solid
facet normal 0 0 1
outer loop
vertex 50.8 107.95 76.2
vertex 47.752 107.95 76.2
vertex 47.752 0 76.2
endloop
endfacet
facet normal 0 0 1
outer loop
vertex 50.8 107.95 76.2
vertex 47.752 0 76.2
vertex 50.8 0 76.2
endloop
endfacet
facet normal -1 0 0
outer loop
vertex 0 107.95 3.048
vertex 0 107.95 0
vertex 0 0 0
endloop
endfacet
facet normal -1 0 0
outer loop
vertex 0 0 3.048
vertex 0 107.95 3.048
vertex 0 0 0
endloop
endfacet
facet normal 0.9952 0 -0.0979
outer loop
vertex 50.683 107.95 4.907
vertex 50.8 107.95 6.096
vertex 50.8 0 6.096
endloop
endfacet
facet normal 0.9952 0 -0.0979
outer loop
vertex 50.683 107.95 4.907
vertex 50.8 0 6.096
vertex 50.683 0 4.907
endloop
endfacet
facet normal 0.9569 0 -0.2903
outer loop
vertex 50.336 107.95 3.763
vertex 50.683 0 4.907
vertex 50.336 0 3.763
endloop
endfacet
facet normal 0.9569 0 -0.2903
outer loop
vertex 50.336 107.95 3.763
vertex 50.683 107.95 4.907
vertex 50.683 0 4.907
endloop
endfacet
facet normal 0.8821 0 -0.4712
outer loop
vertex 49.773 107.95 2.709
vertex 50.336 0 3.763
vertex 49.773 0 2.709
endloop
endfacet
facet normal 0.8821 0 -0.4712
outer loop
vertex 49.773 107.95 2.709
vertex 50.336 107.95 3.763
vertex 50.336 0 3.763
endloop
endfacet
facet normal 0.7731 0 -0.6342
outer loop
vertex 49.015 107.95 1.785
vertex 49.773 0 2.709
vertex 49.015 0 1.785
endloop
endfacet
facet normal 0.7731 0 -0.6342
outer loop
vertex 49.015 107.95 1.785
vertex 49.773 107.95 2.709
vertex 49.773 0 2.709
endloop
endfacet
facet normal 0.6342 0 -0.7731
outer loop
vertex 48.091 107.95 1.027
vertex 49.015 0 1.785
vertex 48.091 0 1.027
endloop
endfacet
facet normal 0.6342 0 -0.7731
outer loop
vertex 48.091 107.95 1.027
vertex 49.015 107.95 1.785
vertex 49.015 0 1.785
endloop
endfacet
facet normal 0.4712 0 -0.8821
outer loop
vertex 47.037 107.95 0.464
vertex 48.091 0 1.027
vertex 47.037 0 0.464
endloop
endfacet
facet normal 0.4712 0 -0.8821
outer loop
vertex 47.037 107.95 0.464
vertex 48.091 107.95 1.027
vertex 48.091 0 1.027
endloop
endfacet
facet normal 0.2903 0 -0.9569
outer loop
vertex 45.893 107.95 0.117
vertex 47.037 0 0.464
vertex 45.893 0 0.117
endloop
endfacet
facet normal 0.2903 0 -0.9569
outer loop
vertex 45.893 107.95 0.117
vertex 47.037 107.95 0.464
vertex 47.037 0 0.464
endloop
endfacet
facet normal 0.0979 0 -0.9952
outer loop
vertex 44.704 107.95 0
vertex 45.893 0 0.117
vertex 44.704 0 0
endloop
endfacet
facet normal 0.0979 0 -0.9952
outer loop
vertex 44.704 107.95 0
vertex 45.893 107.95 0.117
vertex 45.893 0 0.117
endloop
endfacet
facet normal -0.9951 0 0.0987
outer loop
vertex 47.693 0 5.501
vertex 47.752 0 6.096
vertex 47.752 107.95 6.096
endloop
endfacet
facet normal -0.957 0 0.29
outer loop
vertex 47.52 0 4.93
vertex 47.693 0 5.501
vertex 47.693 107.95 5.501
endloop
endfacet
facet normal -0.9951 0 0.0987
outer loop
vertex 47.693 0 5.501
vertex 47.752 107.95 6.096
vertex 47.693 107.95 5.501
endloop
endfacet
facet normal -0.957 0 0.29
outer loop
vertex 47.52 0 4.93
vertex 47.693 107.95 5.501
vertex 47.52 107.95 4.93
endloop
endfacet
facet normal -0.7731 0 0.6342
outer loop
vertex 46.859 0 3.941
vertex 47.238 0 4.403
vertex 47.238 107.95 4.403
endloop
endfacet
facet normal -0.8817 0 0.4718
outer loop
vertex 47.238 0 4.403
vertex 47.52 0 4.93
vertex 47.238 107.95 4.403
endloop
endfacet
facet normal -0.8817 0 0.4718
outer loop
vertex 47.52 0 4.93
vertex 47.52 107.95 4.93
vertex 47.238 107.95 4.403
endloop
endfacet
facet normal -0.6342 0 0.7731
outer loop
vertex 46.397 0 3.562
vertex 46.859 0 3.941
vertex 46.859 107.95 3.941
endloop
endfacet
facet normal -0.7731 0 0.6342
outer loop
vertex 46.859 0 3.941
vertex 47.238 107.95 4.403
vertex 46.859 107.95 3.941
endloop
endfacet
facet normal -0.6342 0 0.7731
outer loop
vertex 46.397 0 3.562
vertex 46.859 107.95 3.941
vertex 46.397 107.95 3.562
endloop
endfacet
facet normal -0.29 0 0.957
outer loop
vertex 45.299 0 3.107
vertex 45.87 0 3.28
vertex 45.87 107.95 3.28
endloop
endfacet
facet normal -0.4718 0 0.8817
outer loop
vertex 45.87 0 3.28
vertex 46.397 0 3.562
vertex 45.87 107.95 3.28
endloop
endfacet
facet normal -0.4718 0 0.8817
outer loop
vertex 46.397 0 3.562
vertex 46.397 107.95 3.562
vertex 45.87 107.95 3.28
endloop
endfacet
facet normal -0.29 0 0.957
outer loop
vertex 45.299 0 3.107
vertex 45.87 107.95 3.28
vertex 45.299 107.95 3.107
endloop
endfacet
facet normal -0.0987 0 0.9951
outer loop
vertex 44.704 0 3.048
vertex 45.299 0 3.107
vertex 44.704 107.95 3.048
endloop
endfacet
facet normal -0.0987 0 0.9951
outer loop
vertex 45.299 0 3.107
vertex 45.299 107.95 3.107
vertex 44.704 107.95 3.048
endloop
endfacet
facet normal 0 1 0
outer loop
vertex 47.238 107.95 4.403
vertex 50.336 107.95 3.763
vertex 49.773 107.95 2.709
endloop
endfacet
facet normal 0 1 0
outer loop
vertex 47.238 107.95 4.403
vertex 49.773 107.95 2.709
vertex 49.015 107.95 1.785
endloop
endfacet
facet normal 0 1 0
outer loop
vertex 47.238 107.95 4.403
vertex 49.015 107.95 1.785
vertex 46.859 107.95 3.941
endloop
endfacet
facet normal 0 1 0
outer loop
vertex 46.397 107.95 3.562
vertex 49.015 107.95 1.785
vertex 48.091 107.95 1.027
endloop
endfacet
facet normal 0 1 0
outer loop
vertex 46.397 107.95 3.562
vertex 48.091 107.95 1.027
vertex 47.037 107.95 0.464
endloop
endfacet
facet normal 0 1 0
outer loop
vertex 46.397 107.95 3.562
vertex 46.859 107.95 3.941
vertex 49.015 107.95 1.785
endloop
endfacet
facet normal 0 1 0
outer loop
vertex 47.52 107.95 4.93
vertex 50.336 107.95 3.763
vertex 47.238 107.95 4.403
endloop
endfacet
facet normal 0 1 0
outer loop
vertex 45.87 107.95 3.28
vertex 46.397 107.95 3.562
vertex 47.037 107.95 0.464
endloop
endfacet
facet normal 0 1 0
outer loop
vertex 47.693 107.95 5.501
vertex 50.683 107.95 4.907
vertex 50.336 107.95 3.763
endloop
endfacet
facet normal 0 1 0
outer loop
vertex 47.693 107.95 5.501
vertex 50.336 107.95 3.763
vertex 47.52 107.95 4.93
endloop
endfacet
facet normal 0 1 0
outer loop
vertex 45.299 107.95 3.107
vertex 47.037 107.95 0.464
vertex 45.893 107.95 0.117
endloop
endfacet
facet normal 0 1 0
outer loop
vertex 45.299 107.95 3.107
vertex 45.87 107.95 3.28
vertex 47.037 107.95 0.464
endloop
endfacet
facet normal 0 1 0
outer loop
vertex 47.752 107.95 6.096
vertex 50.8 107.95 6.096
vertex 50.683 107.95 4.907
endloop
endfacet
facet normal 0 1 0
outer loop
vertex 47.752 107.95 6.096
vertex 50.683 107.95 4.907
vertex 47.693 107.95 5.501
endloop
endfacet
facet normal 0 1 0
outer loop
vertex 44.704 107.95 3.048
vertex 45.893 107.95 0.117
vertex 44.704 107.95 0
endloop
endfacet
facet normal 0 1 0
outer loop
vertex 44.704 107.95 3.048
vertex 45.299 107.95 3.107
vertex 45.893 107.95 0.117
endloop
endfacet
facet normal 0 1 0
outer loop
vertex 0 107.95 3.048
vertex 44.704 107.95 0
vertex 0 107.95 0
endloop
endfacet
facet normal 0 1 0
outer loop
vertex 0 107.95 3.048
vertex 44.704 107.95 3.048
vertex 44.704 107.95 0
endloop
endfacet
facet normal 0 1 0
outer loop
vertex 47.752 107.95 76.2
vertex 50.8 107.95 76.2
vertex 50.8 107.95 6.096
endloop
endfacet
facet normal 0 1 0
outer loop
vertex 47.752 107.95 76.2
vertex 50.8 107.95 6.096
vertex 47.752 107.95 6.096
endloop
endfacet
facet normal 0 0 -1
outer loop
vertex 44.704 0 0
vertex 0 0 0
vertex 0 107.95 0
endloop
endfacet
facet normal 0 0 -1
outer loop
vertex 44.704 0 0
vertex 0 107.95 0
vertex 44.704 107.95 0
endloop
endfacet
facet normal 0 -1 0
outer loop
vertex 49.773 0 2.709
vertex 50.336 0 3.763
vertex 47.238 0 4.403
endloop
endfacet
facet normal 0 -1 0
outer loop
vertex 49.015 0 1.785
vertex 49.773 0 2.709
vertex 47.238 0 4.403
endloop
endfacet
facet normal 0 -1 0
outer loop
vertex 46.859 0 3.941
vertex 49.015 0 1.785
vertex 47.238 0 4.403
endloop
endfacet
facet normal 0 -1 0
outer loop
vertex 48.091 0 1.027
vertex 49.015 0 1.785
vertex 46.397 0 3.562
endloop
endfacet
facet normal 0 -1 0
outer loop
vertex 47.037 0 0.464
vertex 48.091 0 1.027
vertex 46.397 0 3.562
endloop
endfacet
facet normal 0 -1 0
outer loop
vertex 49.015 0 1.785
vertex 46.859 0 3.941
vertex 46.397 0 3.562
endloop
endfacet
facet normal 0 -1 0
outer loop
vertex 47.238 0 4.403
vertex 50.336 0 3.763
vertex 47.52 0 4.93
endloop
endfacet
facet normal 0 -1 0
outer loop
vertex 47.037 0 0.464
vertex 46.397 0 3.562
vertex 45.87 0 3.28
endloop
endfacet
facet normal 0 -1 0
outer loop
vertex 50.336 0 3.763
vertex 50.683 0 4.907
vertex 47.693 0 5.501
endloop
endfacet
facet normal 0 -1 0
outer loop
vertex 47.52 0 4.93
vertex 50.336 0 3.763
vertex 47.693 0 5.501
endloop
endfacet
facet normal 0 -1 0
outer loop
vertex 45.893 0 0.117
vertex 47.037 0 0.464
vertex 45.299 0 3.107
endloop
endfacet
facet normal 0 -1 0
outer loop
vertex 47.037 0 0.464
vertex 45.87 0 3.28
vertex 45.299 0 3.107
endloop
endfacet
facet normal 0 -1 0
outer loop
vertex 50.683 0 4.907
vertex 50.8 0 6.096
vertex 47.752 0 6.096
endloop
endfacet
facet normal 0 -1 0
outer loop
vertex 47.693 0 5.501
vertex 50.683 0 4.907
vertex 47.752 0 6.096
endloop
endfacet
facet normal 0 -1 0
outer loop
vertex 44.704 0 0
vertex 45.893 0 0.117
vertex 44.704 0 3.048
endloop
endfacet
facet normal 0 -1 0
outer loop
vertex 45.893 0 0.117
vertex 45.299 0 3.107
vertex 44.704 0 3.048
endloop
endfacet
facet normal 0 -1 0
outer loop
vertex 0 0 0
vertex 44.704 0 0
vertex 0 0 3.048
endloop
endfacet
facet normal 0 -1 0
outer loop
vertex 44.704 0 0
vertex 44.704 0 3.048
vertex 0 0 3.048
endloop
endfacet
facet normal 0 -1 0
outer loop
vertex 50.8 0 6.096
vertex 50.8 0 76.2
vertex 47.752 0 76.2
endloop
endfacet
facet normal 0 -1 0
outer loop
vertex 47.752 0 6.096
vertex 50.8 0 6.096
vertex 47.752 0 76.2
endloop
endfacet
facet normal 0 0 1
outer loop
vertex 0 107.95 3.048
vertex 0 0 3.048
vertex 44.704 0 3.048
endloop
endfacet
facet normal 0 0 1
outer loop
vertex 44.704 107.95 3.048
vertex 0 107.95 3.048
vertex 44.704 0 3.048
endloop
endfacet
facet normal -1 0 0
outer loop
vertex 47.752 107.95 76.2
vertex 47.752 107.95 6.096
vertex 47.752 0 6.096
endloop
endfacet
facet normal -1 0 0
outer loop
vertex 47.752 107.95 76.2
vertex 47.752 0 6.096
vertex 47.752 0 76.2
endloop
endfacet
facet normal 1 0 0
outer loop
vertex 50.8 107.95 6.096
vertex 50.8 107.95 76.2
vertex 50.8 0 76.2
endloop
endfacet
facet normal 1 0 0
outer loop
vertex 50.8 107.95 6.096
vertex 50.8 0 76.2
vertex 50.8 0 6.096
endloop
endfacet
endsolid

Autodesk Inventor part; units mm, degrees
ref_plane "YZ Plane" through (0, 0, 0) normal (1, 0, 0) x (0, 1, 0)
ref_plane "XZ Plane" through (0, 0, 0) normal (0, 1, 0) x (-1, 0, 0)
ref_plane "XY Plane" through (0, 0, 0) normal (0, 0, 1) x (1, 0, 0)
sketch "Sketch1" plane through (0, 0, 0) normal (0, 0, 1) x (1, 0, 0)
  line L0 (0, 0) -> (50.8, 0)
  line L1 (50.8, 0) -> (50.8, 107.95)
  line L2 (50.8, 107.95) -> (0, 107.95)
  line L3 (0, 107.95) -> (0, 0)
  dimension "d0" = 50.8
  dimension "d1" = 107.95
extrude "Plate1" add sketch "Sketch1" along normal blind 3.048
sketch "Sketch2" plane through (47.752, 107.95, 0) normal (1, 0, 0) x (0, 1, 0)
  line L0 (-107.95, 0) -> (0, 0)
  line L1 (0, 0) -> (0, 76.2)
  line L2 (0, 76.2) -> (-107.95, 76.2)
  line L3 (-107.95, 76.2) -> (-107.95, 0)
edge flange "Flange1" height 76.2 angle 90 thickness 3.048 bend radius 3.048 thickness toward (1, 0, 0) relief tear relief width 3.048 relief depth 1.524 edges at (50.8, 53.975, 3.048) wall of the first edge with corners at (47.752, 0, 0) (47.752, 107.95, 0) (47.752, 107.95, 76.2) (47.752, 0, 76.2)
bend "Bend1"
corner "Corner1"
equation "\"d3\" = BendReliefWidth"
equation "\"d4\" = BendReliefDepth"
equation "\"d5\" = MinimumRemnant"
equation "\"d6\" = BendRadius"
equation "\"d9\" = BendRadius"
equation "\"d10\" = CornerReliefSize"
equation "\"d11\" = GapSize"
equation "\"d12\" = JacobiRadiusSize"
equation "\"BendRadius\" = Thickness"
equation "\"BendReliefWidth\" = Thickness"
equation "\"BendReliefDepth\" = 0.5 * Thickness"
equation "\"CornerReliefSize\" = 4 * Thickness"
equation "\"MinimumRemnant\" = 2 * Thickness"
equation "\"TransitionRadius\" = BendRadius"
equation "\"JacobiRadiusSize\" = BendRadius"
equation "\"GapSize\" = Thickness"
equation "\"d2\" = BendRadius"
equation "\"Thickness\" = 3.048"
properties part number "Claw - L bracket"
